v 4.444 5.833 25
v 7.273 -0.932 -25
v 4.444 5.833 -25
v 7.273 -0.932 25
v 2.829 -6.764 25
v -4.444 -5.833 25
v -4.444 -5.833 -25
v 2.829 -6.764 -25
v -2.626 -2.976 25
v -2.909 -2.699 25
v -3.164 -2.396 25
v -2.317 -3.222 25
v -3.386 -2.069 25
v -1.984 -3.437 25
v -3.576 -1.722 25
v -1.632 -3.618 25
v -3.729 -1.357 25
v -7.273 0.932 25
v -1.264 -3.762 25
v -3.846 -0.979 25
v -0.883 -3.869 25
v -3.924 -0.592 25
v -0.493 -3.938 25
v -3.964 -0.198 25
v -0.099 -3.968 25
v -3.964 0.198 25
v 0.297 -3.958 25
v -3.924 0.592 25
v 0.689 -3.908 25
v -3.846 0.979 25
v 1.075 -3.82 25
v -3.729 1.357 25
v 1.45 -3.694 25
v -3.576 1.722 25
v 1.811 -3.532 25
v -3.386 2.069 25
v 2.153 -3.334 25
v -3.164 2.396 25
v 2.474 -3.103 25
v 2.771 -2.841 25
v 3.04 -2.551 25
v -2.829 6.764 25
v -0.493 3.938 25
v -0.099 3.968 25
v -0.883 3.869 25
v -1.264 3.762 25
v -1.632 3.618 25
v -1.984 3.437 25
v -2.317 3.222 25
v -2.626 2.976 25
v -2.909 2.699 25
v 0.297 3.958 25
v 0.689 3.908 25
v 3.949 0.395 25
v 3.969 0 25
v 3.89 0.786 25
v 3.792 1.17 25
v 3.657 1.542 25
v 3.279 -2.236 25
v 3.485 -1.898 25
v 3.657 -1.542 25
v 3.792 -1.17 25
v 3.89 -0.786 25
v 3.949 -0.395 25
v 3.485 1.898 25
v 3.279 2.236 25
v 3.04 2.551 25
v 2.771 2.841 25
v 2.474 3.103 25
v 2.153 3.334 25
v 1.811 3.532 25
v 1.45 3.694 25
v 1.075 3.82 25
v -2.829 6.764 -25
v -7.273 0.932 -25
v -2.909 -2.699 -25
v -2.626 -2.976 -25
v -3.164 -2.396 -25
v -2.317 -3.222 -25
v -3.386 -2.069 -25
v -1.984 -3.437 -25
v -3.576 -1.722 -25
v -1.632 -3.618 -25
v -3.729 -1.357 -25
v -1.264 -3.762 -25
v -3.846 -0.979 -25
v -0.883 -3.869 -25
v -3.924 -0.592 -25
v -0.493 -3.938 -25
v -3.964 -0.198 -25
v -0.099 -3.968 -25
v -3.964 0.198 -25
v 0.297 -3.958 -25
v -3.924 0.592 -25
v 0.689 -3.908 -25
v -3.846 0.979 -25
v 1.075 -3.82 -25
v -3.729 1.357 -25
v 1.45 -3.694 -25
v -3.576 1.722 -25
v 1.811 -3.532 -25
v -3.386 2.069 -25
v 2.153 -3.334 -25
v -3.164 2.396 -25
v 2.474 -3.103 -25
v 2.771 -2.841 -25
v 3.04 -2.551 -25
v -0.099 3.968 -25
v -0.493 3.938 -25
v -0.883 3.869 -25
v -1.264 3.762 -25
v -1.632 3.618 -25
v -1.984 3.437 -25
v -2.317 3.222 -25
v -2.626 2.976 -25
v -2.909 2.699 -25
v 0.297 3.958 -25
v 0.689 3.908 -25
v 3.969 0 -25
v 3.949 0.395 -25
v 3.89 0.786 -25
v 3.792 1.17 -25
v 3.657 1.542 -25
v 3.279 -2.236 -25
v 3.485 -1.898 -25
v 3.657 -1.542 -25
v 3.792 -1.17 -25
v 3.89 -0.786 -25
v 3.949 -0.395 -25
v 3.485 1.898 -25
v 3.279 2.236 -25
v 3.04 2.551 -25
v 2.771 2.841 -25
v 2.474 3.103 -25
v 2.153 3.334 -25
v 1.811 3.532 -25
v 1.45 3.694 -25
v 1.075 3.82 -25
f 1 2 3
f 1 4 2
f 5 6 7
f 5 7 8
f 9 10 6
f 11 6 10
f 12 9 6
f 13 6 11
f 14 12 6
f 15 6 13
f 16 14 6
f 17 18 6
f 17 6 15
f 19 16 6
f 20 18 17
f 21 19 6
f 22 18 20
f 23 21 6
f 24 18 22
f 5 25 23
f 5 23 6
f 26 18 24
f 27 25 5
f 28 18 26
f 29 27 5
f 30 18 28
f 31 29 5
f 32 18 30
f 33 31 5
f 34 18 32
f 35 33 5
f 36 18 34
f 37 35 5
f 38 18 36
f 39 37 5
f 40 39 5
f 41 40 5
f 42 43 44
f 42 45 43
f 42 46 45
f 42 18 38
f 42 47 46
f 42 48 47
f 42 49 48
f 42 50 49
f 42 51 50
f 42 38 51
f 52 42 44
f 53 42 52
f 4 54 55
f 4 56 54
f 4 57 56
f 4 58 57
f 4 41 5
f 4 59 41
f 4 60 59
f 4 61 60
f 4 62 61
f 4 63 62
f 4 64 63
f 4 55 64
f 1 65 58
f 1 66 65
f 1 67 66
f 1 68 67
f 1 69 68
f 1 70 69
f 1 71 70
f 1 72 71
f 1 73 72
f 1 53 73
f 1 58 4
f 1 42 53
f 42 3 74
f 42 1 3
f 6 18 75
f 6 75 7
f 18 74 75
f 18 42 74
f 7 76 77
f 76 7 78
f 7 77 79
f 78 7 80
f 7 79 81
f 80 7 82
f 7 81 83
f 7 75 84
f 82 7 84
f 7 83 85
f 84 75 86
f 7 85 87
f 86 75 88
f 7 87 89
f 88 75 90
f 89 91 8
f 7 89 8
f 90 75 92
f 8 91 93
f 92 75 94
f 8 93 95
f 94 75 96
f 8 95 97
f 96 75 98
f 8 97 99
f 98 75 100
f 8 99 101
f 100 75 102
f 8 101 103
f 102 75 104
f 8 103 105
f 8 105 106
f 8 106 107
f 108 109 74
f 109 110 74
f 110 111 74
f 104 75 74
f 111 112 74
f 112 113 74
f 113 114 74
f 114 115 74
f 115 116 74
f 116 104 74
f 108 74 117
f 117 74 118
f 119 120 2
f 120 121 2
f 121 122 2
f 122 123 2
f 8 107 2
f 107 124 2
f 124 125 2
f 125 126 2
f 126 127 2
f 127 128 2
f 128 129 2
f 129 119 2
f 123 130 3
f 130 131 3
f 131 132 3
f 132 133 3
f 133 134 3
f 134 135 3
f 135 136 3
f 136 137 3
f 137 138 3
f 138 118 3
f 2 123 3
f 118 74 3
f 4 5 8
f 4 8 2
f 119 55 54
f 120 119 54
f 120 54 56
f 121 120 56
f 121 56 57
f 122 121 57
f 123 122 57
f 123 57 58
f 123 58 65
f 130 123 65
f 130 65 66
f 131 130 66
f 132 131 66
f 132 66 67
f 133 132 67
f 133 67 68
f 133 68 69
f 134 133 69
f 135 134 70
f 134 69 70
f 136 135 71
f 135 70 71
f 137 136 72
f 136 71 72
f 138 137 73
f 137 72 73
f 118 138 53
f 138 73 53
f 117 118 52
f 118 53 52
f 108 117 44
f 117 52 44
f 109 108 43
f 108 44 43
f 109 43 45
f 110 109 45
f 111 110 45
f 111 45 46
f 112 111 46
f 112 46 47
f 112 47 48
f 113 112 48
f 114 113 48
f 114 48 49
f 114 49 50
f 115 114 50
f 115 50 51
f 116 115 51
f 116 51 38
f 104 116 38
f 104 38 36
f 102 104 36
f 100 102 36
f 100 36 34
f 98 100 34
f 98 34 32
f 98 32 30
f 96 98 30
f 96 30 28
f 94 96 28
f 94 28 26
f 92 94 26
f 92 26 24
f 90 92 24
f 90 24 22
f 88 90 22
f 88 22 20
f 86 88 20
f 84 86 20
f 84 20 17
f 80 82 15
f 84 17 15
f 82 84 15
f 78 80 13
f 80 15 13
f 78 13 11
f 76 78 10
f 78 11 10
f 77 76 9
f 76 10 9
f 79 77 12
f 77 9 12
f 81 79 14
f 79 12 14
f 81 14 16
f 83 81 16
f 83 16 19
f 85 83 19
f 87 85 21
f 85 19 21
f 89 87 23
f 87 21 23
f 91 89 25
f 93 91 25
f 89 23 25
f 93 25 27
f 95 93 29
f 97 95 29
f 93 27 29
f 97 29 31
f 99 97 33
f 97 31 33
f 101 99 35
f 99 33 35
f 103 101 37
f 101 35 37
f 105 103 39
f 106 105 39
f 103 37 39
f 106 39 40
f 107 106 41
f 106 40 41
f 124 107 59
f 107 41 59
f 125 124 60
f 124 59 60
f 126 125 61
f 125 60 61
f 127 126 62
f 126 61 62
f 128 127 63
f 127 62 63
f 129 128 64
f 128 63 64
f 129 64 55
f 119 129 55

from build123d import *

# Parameters (mm, degrees)
F1_DEPTH = 25
F2_R     = 3.96875
F3_DEPTH = 50.001


with BuildPart() as f1:
    # F0 (on Top) → F1 (new body, symmetric)
    with BuildSketch(Plane.XY):
        Polygon((-2.829355, 6.764472), (-7.272882, 0.931943), (-4.443527, -5.832529), (2.829355, -6.764472), (7.272882, -0.931943), (4.443527, 5.832529), align=None)
    extrude(amount=F1_DEPTH, both=True)

    # F2 (on face) → F3 (cut, through all)
    with BuildSketch(Plane.XY.offset(25)):
        Circle(F2_R)
    extrude(amount=-F3_DEPTH, mode=Mode.SUBTRACT)


solid = f1.part
